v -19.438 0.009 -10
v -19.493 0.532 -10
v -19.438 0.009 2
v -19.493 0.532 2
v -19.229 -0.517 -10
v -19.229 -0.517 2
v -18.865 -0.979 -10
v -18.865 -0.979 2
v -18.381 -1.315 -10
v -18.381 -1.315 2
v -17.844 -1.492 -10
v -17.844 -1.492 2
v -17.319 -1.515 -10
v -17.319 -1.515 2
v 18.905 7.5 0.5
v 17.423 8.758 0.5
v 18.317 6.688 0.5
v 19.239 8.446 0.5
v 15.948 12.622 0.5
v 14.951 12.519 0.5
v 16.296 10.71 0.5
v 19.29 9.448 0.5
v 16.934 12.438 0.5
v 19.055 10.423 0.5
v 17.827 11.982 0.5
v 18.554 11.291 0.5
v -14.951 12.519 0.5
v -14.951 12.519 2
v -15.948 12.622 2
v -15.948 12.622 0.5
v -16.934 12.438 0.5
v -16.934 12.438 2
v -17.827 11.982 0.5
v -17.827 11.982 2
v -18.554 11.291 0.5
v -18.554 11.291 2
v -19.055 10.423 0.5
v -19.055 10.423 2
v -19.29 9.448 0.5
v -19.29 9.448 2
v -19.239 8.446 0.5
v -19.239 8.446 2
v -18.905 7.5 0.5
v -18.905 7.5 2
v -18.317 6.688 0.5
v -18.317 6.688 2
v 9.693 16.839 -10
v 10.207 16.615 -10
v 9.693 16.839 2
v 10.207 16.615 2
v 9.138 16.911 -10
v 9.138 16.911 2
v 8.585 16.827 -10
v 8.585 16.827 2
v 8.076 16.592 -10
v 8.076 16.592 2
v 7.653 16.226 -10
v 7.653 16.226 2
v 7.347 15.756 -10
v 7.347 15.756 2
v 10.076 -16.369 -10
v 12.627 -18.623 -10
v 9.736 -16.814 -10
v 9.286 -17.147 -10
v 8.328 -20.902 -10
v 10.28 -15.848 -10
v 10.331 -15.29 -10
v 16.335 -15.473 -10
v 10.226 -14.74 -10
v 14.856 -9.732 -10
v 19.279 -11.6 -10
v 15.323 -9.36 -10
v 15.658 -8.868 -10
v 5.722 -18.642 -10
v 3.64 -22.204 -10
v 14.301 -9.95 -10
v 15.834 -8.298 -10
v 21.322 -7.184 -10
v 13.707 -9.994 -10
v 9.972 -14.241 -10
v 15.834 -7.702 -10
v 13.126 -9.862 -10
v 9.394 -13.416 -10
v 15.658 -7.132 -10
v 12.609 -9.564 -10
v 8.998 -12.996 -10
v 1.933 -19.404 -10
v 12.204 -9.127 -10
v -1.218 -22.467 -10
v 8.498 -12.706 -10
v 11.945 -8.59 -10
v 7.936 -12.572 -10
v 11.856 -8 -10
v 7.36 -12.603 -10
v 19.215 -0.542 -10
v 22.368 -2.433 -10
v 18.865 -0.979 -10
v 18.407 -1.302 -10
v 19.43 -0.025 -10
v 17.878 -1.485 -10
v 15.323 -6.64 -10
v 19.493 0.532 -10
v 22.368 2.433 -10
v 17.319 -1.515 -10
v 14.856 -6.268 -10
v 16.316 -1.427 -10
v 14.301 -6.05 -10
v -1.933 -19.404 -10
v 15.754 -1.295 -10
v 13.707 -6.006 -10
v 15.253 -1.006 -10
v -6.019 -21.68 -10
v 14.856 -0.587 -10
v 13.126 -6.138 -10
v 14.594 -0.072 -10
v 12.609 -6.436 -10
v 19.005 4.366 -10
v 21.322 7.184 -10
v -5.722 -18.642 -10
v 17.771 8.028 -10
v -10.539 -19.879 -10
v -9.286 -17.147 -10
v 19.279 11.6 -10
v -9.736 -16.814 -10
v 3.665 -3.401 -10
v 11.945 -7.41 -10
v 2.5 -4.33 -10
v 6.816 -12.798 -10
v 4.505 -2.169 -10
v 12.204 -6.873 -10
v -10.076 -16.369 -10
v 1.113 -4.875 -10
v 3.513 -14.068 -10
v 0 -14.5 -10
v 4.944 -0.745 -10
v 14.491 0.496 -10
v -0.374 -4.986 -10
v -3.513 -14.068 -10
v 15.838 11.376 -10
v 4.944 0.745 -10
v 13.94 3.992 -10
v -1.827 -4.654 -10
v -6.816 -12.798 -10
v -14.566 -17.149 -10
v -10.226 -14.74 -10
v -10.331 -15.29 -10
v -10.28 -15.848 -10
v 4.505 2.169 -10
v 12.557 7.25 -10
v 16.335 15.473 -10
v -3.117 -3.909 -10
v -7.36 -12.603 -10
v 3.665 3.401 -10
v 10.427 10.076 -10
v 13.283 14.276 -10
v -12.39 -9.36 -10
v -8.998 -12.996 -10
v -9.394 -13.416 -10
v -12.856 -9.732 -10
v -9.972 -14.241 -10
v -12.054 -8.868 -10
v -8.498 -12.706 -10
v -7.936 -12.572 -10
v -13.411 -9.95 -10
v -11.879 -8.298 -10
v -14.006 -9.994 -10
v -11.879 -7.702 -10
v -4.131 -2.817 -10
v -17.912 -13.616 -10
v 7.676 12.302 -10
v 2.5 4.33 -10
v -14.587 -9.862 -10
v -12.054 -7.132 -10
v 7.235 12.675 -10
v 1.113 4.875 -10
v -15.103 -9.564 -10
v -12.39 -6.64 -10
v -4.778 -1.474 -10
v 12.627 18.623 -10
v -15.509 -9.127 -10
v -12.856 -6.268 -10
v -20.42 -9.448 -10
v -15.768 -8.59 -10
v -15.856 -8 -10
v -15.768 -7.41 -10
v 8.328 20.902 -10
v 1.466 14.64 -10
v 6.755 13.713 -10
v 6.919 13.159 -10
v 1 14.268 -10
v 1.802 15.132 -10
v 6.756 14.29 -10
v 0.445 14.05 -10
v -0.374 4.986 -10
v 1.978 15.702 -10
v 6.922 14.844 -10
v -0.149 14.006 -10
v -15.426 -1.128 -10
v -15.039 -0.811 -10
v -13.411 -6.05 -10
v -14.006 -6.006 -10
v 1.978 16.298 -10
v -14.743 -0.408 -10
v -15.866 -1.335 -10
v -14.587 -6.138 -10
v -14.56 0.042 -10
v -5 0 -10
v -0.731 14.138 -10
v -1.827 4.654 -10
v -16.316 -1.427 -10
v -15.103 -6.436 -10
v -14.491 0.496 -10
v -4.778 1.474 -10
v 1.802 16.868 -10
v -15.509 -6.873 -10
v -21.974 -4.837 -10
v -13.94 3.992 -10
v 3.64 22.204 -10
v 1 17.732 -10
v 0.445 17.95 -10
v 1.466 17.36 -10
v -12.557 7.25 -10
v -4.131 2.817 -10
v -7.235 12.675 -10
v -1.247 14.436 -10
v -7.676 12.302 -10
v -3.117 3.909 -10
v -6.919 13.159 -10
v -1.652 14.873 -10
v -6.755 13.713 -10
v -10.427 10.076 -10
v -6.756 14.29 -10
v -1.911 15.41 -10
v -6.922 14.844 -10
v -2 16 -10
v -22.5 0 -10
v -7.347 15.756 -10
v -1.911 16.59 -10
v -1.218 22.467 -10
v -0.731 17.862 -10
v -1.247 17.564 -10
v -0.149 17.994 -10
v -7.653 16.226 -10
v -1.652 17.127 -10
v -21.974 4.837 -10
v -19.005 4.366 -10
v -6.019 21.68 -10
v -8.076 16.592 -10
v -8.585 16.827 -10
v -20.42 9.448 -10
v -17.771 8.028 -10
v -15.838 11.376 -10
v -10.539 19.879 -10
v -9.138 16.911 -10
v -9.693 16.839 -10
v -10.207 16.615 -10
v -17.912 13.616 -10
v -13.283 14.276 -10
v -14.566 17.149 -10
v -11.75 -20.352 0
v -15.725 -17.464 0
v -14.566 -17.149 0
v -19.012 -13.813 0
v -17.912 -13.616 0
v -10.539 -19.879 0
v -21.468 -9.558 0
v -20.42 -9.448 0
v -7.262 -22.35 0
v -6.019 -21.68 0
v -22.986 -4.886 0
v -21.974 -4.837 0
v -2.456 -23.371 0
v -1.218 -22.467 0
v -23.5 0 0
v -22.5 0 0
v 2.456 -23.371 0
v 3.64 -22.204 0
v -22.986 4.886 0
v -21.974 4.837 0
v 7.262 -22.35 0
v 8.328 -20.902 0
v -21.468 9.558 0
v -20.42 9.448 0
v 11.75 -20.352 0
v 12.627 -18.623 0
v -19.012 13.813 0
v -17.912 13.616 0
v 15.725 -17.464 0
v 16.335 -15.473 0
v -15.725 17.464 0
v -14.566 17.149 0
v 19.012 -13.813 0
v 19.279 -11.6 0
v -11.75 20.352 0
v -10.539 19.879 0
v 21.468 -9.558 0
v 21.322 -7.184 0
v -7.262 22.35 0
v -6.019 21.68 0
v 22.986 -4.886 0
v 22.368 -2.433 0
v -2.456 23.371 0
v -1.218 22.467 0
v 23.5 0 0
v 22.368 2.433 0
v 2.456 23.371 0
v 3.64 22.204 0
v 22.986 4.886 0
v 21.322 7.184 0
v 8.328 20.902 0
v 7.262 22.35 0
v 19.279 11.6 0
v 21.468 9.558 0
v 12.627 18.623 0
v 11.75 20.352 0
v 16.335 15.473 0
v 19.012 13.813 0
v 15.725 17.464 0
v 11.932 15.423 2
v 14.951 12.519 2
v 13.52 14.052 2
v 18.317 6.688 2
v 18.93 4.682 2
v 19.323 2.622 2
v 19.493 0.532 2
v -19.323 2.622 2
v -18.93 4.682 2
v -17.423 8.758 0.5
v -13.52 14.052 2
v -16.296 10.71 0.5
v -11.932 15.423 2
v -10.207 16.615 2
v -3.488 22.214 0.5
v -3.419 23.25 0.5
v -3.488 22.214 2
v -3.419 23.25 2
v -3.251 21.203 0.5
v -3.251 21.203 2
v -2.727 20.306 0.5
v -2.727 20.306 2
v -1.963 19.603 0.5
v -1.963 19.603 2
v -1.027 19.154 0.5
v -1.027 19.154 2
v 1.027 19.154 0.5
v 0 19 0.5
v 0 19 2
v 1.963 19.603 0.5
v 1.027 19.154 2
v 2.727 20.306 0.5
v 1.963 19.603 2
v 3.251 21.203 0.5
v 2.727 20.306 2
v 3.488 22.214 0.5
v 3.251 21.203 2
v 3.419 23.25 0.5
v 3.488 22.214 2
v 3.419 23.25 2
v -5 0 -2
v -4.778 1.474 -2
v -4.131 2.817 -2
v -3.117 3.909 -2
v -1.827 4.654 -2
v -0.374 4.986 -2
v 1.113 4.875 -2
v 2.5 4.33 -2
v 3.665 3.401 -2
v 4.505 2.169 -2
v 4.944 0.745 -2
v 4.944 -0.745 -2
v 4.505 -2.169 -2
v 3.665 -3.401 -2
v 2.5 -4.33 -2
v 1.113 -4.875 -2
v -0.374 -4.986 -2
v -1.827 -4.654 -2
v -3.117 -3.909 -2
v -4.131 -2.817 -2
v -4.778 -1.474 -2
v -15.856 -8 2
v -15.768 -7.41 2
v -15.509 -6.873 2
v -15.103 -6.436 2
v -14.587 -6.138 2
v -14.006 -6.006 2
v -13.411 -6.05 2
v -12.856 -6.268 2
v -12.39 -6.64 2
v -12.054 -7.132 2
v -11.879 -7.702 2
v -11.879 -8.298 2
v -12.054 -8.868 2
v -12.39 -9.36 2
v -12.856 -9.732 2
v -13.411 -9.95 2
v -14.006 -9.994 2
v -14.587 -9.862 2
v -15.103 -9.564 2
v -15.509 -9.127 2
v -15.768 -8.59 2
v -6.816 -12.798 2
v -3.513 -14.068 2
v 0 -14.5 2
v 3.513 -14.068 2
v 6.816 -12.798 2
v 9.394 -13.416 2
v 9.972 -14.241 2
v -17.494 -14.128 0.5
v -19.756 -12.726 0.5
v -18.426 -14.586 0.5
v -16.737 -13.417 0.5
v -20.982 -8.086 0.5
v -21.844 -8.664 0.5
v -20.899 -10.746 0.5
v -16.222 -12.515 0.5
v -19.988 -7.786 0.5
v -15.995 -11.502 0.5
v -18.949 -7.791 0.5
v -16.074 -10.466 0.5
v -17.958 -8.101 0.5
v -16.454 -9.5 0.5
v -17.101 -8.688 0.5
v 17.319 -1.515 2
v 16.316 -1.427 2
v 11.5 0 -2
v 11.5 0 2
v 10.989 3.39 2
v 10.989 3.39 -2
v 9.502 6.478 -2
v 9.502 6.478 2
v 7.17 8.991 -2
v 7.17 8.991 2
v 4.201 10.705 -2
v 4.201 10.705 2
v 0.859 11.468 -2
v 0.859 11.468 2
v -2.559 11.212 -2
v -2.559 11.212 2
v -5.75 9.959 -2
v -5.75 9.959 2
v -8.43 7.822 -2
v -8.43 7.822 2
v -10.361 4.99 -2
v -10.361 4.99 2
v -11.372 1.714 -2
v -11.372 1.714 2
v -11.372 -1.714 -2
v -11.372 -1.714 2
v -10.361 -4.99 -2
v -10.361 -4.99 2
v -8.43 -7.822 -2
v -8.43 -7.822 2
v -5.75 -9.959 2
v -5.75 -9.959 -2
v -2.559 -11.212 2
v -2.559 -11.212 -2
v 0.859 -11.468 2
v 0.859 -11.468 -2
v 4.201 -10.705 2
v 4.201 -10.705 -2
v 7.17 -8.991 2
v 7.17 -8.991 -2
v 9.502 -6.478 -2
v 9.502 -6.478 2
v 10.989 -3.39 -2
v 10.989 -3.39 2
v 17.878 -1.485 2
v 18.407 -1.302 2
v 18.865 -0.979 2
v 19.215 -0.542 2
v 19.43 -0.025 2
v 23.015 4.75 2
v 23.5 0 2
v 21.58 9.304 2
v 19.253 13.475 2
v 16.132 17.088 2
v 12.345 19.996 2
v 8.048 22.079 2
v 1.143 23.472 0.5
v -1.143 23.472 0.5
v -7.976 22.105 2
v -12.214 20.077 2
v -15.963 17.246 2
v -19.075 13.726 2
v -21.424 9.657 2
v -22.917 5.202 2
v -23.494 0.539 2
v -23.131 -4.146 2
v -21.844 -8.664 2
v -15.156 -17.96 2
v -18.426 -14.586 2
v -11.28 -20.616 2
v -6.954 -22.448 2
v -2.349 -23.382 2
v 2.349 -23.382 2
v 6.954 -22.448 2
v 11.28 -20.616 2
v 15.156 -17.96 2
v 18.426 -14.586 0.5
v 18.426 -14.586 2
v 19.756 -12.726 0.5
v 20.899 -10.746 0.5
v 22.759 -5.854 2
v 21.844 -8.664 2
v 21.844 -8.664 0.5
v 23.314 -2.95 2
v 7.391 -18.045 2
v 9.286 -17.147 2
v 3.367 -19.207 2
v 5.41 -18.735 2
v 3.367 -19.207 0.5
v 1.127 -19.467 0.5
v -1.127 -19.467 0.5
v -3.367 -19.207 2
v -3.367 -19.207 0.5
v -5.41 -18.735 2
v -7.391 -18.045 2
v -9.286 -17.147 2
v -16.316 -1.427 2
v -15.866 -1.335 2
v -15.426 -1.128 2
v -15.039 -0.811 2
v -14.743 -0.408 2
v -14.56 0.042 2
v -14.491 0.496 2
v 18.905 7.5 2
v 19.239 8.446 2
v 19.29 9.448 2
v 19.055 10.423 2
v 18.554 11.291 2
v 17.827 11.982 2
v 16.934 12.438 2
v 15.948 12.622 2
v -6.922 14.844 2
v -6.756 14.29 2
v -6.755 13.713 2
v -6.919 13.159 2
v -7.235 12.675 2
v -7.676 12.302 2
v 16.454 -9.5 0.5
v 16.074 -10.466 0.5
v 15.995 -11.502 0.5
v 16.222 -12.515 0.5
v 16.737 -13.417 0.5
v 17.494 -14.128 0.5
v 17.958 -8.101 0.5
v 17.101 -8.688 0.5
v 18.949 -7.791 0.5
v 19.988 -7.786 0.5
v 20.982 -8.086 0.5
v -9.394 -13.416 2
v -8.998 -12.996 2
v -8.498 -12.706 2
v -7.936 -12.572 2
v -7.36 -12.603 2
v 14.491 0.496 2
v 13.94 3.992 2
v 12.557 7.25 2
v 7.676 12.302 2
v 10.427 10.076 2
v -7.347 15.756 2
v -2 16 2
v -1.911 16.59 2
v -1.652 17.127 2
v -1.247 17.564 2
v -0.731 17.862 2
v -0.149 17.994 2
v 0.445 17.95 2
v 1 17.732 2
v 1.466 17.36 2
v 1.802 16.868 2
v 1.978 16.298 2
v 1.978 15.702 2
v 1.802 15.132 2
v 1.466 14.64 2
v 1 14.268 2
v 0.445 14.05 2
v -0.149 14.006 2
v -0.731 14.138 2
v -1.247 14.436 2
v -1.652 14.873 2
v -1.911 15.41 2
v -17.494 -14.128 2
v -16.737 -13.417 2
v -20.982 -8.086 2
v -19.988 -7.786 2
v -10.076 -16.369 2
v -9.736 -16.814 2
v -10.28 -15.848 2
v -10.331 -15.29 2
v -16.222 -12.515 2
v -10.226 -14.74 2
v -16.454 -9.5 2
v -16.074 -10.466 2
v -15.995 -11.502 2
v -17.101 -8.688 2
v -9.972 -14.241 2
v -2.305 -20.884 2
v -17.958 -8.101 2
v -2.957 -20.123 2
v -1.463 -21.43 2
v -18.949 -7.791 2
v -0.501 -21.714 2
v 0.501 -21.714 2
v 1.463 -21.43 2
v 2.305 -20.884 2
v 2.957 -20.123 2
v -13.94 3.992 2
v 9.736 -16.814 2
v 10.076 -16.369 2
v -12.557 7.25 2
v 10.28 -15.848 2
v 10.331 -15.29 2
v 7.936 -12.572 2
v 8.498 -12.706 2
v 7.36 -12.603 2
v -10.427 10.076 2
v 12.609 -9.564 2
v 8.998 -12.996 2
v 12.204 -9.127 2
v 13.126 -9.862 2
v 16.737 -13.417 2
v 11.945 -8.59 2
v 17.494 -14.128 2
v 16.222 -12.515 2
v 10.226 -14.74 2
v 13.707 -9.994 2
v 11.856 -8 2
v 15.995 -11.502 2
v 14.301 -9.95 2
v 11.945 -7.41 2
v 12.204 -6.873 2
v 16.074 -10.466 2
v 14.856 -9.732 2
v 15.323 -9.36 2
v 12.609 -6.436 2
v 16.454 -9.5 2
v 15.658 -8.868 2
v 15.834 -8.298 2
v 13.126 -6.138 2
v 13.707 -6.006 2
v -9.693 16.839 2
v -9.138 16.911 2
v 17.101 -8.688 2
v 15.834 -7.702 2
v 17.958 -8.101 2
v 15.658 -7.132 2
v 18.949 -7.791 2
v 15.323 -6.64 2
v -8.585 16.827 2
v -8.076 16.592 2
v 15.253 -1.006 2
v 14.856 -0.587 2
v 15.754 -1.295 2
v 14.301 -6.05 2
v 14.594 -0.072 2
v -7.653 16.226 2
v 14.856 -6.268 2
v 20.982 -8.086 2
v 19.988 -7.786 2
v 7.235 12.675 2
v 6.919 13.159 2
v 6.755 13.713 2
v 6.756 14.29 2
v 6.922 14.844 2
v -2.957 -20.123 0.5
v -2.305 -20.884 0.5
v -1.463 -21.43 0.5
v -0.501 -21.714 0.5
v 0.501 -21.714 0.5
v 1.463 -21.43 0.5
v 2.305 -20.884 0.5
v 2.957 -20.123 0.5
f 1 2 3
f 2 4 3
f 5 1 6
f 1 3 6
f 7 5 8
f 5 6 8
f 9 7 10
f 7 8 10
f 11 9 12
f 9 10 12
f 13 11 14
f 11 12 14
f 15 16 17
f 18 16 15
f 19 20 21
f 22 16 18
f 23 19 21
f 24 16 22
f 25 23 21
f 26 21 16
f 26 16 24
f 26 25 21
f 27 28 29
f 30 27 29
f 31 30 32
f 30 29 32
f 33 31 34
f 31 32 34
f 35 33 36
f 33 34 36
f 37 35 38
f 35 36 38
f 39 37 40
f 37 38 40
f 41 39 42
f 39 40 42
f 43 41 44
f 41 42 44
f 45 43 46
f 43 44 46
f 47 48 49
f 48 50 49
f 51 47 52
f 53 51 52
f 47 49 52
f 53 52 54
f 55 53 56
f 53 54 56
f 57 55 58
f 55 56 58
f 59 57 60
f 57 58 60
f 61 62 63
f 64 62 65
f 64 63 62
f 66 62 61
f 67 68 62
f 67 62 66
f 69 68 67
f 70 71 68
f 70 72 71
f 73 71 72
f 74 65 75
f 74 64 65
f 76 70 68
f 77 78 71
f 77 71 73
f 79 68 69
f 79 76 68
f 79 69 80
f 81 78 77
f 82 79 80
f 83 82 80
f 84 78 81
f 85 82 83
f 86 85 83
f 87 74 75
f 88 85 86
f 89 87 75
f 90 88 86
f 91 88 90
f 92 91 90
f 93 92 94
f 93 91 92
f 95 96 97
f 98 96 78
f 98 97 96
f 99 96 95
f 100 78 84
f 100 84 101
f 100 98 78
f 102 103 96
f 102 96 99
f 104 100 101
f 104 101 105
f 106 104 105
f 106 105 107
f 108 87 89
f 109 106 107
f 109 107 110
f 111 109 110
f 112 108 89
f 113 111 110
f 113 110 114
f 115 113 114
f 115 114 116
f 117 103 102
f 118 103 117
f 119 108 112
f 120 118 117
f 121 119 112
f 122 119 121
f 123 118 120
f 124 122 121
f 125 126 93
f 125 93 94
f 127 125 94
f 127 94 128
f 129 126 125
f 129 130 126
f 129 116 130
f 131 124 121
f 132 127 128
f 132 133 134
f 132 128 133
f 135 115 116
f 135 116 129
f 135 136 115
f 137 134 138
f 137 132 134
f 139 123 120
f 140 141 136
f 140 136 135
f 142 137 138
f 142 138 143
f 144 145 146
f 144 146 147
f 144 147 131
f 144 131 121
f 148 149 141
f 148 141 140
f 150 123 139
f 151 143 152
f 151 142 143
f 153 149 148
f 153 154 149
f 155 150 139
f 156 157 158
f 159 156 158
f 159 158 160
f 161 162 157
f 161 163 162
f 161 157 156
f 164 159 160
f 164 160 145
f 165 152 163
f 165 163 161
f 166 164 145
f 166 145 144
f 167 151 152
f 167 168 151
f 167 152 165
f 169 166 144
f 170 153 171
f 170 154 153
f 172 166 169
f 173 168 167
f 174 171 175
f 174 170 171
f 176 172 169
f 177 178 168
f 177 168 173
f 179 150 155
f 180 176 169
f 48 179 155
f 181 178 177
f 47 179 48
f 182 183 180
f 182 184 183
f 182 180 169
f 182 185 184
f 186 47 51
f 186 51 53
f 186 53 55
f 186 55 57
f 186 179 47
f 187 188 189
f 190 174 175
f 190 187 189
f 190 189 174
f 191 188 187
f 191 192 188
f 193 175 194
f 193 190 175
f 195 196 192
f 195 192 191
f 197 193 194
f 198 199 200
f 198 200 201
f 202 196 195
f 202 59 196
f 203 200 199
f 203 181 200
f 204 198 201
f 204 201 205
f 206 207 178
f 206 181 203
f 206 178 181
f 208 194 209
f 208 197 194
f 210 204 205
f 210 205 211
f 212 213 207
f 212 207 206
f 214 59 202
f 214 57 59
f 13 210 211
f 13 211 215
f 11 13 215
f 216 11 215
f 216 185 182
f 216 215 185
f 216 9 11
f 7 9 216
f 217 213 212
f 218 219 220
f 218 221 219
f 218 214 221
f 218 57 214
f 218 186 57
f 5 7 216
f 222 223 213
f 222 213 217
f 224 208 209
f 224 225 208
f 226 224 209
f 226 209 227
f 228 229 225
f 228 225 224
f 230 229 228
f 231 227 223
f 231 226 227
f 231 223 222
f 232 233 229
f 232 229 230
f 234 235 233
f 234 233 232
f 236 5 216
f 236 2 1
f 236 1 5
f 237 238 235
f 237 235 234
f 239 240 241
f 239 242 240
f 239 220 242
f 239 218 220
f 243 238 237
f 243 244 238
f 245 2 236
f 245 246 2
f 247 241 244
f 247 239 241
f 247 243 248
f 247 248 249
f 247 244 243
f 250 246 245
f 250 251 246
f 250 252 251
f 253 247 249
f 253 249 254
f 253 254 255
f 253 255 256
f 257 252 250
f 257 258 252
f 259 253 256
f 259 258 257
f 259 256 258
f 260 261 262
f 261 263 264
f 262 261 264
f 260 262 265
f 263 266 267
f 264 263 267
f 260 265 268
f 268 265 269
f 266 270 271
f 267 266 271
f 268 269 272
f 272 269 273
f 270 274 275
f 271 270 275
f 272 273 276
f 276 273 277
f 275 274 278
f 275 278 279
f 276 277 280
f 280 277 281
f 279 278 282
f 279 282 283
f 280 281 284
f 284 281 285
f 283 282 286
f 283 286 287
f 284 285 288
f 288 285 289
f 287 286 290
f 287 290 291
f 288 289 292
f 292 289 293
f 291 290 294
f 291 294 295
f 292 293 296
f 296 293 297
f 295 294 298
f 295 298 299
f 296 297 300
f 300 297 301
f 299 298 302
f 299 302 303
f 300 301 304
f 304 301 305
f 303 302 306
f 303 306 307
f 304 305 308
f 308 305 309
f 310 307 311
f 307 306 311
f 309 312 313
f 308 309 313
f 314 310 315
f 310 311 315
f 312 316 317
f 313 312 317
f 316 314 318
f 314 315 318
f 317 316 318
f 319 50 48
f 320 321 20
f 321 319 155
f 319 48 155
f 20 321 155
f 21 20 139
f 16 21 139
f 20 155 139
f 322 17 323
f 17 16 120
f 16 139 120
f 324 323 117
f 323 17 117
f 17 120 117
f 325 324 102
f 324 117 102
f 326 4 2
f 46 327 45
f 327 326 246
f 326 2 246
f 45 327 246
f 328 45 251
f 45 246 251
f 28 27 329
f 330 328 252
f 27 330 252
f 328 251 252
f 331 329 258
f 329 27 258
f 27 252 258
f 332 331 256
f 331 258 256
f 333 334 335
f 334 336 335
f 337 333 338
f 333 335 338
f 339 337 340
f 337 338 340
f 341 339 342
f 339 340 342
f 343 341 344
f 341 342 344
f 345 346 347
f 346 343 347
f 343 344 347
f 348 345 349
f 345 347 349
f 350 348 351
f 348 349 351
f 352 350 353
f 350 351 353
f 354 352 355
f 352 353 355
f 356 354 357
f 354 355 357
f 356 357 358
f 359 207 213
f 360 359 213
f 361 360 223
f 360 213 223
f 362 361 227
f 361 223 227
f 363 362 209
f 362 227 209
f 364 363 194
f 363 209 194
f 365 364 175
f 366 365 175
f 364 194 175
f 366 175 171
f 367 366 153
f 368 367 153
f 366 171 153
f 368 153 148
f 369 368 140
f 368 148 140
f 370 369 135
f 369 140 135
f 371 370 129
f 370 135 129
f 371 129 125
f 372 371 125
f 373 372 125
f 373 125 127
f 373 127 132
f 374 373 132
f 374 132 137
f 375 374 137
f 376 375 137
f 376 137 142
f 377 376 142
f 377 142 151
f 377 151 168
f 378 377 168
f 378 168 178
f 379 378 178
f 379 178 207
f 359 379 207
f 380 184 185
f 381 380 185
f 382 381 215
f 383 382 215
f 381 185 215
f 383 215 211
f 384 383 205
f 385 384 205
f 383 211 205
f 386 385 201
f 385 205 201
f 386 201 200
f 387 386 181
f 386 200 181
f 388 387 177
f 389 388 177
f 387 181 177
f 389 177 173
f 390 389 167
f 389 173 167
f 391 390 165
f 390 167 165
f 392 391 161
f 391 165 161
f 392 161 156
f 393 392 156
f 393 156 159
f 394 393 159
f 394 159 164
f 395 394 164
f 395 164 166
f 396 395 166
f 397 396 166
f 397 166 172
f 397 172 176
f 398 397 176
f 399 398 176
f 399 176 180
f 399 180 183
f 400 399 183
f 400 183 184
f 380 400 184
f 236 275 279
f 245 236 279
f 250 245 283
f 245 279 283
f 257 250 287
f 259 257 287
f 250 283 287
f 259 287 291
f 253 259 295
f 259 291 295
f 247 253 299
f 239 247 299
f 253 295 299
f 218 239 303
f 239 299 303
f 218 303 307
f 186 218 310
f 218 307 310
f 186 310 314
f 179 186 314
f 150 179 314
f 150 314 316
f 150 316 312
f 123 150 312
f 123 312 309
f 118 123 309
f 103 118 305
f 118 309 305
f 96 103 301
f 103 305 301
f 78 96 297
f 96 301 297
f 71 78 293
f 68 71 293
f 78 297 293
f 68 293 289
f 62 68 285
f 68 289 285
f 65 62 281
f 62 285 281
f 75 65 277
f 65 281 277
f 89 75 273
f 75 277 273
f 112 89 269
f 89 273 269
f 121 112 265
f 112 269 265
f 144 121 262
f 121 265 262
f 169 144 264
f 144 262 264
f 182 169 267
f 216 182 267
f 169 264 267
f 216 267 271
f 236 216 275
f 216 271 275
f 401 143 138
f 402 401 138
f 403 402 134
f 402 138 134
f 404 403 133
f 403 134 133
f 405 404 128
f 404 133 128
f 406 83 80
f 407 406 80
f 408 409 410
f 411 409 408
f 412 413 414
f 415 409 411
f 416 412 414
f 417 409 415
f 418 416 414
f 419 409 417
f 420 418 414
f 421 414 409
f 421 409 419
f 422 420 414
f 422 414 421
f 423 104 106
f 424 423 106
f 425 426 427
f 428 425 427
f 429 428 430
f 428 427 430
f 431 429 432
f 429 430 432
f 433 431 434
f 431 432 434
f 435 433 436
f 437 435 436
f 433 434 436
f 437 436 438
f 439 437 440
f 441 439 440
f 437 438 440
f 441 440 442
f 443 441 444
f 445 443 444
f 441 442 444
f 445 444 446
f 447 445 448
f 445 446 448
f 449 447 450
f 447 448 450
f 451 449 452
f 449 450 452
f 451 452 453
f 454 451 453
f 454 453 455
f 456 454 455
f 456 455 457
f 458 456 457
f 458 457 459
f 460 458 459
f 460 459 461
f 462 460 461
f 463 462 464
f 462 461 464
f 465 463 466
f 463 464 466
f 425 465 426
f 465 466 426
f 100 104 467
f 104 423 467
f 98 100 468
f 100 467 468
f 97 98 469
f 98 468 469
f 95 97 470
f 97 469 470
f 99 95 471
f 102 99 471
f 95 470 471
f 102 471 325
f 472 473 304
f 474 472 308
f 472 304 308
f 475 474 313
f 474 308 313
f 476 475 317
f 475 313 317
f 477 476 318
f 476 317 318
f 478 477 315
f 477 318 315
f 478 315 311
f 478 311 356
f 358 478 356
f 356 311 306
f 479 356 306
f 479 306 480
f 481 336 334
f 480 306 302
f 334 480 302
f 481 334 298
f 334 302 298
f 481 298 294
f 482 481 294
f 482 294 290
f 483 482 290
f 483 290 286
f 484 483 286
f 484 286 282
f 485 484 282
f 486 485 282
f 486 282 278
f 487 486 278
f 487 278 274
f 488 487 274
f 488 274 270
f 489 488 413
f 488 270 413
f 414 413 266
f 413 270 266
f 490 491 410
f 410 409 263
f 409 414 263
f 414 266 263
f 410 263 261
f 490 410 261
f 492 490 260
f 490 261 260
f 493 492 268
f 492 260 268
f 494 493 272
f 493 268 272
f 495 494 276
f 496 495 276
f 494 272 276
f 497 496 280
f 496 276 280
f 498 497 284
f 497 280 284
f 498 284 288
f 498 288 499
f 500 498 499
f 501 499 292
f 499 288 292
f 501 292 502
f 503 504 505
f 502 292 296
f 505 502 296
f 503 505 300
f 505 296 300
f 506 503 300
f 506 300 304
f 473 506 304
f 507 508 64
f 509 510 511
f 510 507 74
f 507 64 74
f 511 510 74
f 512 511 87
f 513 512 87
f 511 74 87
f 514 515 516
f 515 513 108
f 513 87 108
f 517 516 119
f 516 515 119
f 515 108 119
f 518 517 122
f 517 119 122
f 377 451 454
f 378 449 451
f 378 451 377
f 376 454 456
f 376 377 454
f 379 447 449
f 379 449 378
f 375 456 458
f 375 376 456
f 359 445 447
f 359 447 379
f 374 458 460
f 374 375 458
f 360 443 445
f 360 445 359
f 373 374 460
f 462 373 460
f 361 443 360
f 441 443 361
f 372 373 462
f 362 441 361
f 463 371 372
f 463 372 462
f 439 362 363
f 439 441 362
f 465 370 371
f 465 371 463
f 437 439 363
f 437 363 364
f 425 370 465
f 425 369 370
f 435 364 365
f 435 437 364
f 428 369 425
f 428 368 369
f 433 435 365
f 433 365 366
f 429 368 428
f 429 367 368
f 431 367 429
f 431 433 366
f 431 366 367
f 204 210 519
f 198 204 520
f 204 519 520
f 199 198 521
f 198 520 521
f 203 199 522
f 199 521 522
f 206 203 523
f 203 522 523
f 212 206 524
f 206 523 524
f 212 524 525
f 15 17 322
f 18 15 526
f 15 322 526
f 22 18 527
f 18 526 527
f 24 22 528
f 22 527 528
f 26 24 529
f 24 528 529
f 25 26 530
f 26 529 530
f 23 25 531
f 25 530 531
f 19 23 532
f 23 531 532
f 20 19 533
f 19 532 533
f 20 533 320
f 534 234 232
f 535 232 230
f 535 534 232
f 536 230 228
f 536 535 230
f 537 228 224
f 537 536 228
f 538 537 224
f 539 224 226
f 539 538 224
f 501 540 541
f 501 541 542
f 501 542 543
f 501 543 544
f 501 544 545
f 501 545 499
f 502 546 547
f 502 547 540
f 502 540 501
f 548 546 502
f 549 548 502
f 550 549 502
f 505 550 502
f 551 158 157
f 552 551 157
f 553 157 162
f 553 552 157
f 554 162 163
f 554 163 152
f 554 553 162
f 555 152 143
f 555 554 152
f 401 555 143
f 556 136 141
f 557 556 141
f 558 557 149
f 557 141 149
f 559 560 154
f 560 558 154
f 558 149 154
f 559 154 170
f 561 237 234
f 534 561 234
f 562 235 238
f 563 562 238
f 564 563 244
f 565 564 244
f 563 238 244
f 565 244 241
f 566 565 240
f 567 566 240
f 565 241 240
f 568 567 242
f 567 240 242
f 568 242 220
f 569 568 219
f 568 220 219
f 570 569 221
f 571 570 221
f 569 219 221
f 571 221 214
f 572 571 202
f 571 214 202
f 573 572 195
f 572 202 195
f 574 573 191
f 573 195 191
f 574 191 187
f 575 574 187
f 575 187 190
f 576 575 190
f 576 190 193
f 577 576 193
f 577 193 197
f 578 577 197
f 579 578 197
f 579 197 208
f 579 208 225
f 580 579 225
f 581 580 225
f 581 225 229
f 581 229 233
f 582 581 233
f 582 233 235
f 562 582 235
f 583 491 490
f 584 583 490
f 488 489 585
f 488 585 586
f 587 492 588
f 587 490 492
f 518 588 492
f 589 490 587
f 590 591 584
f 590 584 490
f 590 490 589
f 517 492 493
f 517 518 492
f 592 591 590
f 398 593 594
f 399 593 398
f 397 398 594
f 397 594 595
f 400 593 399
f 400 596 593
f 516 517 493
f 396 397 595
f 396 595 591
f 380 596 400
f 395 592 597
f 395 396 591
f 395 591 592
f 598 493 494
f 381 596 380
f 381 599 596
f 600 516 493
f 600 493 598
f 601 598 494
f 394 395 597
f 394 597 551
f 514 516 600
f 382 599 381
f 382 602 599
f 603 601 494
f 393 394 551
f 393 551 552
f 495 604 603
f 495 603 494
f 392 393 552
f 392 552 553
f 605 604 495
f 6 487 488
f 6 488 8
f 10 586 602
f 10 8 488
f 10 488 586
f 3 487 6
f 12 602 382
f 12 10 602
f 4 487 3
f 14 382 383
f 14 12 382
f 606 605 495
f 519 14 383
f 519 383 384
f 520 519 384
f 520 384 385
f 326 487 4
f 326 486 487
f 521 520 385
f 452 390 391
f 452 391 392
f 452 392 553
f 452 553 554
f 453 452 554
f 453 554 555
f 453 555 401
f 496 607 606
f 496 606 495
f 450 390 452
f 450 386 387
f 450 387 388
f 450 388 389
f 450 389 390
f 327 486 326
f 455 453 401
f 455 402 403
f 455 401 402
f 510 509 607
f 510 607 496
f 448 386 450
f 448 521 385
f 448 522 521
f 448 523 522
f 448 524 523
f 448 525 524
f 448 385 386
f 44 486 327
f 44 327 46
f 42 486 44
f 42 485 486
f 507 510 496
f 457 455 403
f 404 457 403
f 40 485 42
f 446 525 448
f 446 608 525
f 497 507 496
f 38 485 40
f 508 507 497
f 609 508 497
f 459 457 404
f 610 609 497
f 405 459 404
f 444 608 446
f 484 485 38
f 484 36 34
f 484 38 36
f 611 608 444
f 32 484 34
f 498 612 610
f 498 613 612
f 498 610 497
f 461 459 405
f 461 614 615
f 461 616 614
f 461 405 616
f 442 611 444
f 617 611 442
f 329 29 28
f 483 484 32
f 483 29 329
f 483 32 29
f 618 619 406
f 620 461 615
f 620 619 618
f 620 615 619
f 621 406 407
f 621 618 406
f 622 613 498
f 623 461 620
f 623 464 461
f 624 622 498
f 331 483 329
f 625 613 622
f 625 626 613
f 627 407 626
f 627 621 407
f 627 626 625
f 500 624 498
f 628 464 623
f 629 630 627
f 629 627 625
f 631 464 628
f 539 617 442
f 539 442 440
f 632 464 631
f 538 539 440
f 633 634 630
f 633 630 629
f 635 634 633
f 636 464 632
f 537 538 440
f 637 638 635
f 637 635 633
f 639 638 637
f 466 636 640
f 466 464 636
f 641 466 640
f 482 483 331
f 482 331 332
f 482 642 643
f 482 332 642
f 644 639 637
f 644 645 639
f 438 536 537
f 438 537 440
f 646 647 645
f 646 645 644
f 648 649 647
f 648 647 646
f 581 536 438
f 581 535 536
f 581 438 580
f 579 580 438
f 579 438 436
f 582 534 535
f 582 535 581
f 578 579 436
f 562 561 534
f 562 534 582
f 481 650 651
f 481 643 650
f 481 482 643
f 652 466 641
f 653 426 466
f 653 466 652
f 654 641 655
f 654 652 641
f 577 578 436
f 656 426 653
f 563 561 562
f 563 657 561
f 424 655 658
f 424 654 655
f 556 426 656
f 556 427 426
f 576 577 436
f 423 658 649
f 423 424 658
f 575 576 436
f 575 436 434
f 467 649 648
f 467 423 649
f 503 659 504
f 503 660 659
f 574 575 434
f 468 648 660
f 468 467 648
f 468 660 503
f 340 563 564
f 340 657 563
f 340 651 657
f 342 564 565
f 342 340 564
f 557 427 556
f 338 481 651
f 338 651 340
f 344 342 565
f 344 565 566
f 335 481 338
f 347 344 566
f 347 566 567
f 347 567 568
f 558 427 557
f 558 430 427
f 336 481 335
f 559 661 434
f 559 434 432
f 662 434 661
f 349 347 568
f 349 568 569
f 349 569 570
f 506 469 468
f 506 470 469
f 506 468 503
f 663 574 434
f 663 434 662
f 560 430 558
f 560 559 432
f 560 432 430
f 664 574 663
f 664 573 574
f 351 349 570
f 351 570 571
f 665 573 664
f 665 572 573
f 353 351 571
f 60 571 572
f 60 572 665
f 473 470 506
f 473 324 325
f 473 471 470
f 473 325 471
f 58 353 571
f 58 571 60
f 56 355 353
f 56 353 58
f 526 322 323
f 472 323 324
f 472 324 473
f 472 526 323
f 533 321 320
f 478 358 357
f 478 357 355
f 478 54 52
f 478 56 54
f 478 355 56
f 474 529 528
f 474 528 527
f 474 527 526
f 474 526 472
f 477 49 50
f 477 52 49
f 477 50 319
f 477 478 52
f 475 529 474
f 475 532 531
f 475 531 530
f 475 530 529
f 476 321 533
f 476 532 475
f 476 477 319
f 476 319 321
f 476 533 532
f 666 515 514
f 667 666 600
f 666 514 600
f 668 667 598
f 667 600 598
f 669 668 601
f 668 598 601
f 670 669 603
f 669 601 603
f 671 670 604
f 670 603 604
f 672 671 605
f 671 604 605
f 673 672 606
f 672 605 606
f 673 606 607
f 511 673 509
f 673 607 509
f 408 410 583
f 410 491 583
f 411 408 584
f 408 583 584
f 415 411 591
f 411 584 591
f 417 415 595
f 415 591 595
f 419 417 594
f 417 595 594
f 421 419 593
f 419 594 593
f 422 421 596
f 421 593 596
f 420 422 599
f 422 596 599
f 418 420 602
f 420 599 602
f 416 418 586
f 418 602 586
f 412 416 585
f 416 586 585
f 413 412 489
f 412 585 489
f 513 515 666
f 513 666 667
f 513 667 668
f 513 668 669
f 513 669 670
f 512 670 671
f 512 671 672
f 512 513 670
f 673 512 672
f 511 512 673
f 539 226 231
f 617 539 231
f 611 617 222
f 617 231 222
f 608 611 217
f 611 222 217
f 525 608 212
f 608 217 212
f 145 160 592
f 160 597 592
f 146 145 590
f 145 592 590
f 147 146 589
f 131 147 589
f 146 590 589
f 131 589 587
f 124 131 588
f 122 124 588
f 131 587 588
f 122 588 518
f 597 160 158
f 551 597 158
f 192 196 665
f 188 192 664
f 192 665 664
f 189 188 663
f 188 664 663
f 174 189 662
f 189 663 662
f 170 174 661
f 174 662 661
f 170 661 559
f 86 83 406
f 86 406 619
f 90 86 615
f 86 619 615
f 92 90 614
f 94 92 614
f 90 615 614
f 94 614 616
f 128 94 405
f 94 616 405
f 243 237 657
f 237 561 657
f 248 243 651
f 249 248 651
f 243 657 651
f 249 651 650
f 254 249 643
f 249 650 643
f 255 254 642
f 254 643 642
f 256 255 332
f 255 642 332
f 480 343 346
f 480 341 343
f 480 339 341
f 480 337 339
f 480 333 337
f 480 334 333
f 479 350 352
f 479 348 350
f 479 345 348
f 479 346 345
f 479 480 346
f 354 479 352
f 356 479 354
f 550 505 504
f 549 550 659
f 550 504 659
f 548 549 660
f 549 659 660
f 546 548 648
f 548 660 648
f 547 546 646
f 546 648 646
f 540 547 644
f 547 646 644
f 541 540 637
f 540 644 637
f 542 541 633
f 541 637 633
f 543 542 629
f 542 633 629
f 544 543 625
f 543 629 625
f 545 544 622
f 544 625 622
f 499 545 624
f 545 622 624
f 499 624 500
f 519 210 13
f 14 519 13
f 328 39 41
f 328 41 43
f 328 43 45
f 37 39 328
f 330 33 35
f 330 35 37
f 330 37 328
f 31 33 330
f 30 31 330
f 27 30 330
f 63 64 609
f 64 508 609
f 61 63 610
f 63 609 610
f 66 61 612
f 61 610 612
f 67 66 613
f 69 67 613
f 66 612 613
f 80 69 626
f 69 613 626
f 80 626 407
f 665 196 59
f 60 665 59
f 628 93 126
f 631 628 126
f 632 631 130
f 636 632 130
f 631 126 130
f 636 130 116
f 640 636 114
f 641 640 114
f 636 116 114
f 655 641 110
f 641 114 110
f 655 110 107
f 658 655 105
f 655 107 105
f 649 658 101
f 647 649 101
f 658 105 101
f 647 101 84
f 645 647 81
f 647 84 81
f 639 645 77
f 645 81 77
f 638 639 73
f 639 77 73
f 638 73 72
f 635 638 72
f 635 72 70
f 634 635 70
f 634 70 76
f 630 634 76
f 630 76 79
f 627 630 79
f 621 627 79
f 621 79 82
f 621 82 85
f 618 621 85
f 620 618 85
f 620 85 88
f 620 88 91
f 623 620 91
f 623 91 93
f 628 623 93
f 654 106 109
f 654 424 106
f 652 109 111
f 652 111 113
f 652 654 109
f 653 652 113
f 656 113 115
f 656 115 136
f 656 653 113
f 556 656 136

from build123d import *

# Parameters (mm, degrees)
SKETCH_1_R          = 23.5
EXTRUDE_1_DEPTH     = 2
SKETCH_2_R          = 22.5
EXTRUDE_2_DEPTH     = 10
SKETCH_3_R          = 2
CUT_EXTRUDE_1_DEPTH = 14
SKETCH_5_R          = 5
CUT_EXTRUDE_2_DEPTH = 14
CUT_EXTRUDE_3_DEPTH = 14
FILLET_1_R          = 2
SKETCH_7_R          = 3.5
CUT_EXTRUDE_4_DEPTH = 1.5
SKETCH_8_R          = 11.5
CUT_EXTRUDE_5_DEPTH = 4


with BuildPart() as part:
    # 草图1 → 凸台-拉伸1 (new body)
    with BuildSketch(Plane.XY):
        Circle(SKETCH_1_R)
    extrude(amount=EXTRUDE_1_DEPTH)

    # 草图2 → 凸台-拉伸2 (add)
    with BuildSketch(Plane(origin=(0, 0, 0), x_dir=(-1, 0, 0), z_dir=(0, 0, -1))):
        Circle(SKETCH_2_R)
    extrude(amount=EXTRUDE_2_DEPTH)

    # 草图3 → 切除-拉伸1 (cut)
    with BuildSketch(Plane(origin=(0, 0, -10), x_dir=(-1, 0, 0), z_dir=(0, 0, -1))):
        with Locations((0, 16)):
            Circle(SKETCH_3_R)
        with Locations((13.856406461, -8)):
            Circle(SKETCH_3_R)
        with Locations((-13.856406461, -8)):
            Circle(SKETCH_3_R)
    extrude(amount=-CUT_EXTRUDE_1_DEPTH, mode=Mode.SUBTRACT)

    # 草图5 → 切除-拉伸2 (cut)
    with BuildSketch(Plane(origin=(0, 0, -10), x_dir=(-1, 0, 0), z_dir=(0, 0, -1))):
        Circle(SKETCH_5_R)
    extrude(amount=-CUT_EXTRUDE_2_DEPTH, mode=Mode.SUBTRACT)

    # 草图6 → 切除-拉伸3 (cut)
    with BuildSketch(Plane(origin=(0, 0, -10), x_dir=(-1, 0, 0), z_dir=(0, 0, -1))):
        with BuildLine():
            Line((8.241056104, 17.673001847), (6.127964795, 13.141462912))
            ThreePointArc((6.127964795, 13.141462912), (12.229175964, 7.790844321), (14.5, 0))
            ThreePointArc((14.5, 0), (14.486199213, -0.632481117), (14.444823122, -1.26375827))
            Line((14.444823122, -1.26375827), (19.425796613, -1.699536984))
            ThreePointArc((19.425796613, -1.699536984), (19.481440321, -0.850578054), (19.5, 0))
            ThreePointArc((19.5, 0), (16.446133193, 10.477342363), (8.241056104, 17.673001847))
        make_face()
        with BuildLine():
            Line((11.184740509, -15.973464864), (8.316858327, -11.877704642))
            ThreePointArc((8.316858327, -11.877704642), (0, -14.5), (-8.316858327, -11.877704642))
            Line((-8.316858327, -11.877704642), (-11.184740509, -15.973464864))
            ThreePointArc((-11.184740509, -15.973464864), (0, -19.5), (11.184740509, -15.973464864))
        make_face()
        with BuildLine():
            Line((-19.425796613, -1.699536984), (-14.444823122, -1.26375827))
            ThreePointArc((-14.444823122, -1.26375827), (-12.557368355, 7.25), (-6.127964795, 13.141462912))
            Line((-6.127964795, 13.141462912), (-8.241056104, 17.673001847))
            ThreePointArc((-8.241056104, 17.673001847), (-16.887495374, 9.75), (-19.425796613, -1.699536984))
        make_face()
    extrude(amount=-CUT_EXTRUDE_3_DEPTH, mode=Mode.SUBTRACT)

    # 圆角1
    fillet_1_edges = [part.edges().sort_by_distance(p)[0] for p in [
        (8.241056104, 17.673001847, -4),
        (6.127964795, 13.141462912, -4),
        (14.444823122, -1.26375827, -4),
        (19.425796613, -1.699536984, -4),
        (11.184740509, -15.973464864, -4),
        (8.316858327, -11.877704642, -4),
        (-8.316858327, -11.877704642, -4),
        (-11.184740509, -15.973464864, -4),
        (-19.425796613, -1.699536984, -4),
        (-14.444823122, -1.26375827, -4),
        (-6.127964795, 13.141462912, -4),
        (-8.241056104, 17.673001847, -4),
    ]]
    fillet(fillet_1_edges, radius=FILLET_1_R)

    # 草图7 → 切除-拉伸4 (cut)
    with BuildSketch(Plane.XY.offset(2)):
        with Locations((0, 22.5)):
            Circle(SKETCH_7_R)
        with Locations((19.485571585, -11.25)):
            Circle(SKETCH_7_R)
        with Locations((-19.485571585, -11.25)):
            Circle(SKETCH_7_R)
        with Locations((15.804963619, 9.125)):
            Circle(SKETCH_7_R)
        with Locations((0, -18.25)):
            Circle(SKETCH_7_R)
        with Locations((-15.804963619, 9.125)):
            Circle(SKETCH_7_R)
    extrude(amount=-CUT_EXTRUDE_4_DEPTH, mode=Mode.SUBTRACT)

    # 草图8 → 切除-拉伸5 (cut)
    with BuildSketch(Plane.XY.offset(2)):
        Circle(SKETCH_8_R)
    extrude(amount=-CUT_EXTRUDE_5_DEPTH, mode=Mode.SUBTRACT)


solid = part.part
